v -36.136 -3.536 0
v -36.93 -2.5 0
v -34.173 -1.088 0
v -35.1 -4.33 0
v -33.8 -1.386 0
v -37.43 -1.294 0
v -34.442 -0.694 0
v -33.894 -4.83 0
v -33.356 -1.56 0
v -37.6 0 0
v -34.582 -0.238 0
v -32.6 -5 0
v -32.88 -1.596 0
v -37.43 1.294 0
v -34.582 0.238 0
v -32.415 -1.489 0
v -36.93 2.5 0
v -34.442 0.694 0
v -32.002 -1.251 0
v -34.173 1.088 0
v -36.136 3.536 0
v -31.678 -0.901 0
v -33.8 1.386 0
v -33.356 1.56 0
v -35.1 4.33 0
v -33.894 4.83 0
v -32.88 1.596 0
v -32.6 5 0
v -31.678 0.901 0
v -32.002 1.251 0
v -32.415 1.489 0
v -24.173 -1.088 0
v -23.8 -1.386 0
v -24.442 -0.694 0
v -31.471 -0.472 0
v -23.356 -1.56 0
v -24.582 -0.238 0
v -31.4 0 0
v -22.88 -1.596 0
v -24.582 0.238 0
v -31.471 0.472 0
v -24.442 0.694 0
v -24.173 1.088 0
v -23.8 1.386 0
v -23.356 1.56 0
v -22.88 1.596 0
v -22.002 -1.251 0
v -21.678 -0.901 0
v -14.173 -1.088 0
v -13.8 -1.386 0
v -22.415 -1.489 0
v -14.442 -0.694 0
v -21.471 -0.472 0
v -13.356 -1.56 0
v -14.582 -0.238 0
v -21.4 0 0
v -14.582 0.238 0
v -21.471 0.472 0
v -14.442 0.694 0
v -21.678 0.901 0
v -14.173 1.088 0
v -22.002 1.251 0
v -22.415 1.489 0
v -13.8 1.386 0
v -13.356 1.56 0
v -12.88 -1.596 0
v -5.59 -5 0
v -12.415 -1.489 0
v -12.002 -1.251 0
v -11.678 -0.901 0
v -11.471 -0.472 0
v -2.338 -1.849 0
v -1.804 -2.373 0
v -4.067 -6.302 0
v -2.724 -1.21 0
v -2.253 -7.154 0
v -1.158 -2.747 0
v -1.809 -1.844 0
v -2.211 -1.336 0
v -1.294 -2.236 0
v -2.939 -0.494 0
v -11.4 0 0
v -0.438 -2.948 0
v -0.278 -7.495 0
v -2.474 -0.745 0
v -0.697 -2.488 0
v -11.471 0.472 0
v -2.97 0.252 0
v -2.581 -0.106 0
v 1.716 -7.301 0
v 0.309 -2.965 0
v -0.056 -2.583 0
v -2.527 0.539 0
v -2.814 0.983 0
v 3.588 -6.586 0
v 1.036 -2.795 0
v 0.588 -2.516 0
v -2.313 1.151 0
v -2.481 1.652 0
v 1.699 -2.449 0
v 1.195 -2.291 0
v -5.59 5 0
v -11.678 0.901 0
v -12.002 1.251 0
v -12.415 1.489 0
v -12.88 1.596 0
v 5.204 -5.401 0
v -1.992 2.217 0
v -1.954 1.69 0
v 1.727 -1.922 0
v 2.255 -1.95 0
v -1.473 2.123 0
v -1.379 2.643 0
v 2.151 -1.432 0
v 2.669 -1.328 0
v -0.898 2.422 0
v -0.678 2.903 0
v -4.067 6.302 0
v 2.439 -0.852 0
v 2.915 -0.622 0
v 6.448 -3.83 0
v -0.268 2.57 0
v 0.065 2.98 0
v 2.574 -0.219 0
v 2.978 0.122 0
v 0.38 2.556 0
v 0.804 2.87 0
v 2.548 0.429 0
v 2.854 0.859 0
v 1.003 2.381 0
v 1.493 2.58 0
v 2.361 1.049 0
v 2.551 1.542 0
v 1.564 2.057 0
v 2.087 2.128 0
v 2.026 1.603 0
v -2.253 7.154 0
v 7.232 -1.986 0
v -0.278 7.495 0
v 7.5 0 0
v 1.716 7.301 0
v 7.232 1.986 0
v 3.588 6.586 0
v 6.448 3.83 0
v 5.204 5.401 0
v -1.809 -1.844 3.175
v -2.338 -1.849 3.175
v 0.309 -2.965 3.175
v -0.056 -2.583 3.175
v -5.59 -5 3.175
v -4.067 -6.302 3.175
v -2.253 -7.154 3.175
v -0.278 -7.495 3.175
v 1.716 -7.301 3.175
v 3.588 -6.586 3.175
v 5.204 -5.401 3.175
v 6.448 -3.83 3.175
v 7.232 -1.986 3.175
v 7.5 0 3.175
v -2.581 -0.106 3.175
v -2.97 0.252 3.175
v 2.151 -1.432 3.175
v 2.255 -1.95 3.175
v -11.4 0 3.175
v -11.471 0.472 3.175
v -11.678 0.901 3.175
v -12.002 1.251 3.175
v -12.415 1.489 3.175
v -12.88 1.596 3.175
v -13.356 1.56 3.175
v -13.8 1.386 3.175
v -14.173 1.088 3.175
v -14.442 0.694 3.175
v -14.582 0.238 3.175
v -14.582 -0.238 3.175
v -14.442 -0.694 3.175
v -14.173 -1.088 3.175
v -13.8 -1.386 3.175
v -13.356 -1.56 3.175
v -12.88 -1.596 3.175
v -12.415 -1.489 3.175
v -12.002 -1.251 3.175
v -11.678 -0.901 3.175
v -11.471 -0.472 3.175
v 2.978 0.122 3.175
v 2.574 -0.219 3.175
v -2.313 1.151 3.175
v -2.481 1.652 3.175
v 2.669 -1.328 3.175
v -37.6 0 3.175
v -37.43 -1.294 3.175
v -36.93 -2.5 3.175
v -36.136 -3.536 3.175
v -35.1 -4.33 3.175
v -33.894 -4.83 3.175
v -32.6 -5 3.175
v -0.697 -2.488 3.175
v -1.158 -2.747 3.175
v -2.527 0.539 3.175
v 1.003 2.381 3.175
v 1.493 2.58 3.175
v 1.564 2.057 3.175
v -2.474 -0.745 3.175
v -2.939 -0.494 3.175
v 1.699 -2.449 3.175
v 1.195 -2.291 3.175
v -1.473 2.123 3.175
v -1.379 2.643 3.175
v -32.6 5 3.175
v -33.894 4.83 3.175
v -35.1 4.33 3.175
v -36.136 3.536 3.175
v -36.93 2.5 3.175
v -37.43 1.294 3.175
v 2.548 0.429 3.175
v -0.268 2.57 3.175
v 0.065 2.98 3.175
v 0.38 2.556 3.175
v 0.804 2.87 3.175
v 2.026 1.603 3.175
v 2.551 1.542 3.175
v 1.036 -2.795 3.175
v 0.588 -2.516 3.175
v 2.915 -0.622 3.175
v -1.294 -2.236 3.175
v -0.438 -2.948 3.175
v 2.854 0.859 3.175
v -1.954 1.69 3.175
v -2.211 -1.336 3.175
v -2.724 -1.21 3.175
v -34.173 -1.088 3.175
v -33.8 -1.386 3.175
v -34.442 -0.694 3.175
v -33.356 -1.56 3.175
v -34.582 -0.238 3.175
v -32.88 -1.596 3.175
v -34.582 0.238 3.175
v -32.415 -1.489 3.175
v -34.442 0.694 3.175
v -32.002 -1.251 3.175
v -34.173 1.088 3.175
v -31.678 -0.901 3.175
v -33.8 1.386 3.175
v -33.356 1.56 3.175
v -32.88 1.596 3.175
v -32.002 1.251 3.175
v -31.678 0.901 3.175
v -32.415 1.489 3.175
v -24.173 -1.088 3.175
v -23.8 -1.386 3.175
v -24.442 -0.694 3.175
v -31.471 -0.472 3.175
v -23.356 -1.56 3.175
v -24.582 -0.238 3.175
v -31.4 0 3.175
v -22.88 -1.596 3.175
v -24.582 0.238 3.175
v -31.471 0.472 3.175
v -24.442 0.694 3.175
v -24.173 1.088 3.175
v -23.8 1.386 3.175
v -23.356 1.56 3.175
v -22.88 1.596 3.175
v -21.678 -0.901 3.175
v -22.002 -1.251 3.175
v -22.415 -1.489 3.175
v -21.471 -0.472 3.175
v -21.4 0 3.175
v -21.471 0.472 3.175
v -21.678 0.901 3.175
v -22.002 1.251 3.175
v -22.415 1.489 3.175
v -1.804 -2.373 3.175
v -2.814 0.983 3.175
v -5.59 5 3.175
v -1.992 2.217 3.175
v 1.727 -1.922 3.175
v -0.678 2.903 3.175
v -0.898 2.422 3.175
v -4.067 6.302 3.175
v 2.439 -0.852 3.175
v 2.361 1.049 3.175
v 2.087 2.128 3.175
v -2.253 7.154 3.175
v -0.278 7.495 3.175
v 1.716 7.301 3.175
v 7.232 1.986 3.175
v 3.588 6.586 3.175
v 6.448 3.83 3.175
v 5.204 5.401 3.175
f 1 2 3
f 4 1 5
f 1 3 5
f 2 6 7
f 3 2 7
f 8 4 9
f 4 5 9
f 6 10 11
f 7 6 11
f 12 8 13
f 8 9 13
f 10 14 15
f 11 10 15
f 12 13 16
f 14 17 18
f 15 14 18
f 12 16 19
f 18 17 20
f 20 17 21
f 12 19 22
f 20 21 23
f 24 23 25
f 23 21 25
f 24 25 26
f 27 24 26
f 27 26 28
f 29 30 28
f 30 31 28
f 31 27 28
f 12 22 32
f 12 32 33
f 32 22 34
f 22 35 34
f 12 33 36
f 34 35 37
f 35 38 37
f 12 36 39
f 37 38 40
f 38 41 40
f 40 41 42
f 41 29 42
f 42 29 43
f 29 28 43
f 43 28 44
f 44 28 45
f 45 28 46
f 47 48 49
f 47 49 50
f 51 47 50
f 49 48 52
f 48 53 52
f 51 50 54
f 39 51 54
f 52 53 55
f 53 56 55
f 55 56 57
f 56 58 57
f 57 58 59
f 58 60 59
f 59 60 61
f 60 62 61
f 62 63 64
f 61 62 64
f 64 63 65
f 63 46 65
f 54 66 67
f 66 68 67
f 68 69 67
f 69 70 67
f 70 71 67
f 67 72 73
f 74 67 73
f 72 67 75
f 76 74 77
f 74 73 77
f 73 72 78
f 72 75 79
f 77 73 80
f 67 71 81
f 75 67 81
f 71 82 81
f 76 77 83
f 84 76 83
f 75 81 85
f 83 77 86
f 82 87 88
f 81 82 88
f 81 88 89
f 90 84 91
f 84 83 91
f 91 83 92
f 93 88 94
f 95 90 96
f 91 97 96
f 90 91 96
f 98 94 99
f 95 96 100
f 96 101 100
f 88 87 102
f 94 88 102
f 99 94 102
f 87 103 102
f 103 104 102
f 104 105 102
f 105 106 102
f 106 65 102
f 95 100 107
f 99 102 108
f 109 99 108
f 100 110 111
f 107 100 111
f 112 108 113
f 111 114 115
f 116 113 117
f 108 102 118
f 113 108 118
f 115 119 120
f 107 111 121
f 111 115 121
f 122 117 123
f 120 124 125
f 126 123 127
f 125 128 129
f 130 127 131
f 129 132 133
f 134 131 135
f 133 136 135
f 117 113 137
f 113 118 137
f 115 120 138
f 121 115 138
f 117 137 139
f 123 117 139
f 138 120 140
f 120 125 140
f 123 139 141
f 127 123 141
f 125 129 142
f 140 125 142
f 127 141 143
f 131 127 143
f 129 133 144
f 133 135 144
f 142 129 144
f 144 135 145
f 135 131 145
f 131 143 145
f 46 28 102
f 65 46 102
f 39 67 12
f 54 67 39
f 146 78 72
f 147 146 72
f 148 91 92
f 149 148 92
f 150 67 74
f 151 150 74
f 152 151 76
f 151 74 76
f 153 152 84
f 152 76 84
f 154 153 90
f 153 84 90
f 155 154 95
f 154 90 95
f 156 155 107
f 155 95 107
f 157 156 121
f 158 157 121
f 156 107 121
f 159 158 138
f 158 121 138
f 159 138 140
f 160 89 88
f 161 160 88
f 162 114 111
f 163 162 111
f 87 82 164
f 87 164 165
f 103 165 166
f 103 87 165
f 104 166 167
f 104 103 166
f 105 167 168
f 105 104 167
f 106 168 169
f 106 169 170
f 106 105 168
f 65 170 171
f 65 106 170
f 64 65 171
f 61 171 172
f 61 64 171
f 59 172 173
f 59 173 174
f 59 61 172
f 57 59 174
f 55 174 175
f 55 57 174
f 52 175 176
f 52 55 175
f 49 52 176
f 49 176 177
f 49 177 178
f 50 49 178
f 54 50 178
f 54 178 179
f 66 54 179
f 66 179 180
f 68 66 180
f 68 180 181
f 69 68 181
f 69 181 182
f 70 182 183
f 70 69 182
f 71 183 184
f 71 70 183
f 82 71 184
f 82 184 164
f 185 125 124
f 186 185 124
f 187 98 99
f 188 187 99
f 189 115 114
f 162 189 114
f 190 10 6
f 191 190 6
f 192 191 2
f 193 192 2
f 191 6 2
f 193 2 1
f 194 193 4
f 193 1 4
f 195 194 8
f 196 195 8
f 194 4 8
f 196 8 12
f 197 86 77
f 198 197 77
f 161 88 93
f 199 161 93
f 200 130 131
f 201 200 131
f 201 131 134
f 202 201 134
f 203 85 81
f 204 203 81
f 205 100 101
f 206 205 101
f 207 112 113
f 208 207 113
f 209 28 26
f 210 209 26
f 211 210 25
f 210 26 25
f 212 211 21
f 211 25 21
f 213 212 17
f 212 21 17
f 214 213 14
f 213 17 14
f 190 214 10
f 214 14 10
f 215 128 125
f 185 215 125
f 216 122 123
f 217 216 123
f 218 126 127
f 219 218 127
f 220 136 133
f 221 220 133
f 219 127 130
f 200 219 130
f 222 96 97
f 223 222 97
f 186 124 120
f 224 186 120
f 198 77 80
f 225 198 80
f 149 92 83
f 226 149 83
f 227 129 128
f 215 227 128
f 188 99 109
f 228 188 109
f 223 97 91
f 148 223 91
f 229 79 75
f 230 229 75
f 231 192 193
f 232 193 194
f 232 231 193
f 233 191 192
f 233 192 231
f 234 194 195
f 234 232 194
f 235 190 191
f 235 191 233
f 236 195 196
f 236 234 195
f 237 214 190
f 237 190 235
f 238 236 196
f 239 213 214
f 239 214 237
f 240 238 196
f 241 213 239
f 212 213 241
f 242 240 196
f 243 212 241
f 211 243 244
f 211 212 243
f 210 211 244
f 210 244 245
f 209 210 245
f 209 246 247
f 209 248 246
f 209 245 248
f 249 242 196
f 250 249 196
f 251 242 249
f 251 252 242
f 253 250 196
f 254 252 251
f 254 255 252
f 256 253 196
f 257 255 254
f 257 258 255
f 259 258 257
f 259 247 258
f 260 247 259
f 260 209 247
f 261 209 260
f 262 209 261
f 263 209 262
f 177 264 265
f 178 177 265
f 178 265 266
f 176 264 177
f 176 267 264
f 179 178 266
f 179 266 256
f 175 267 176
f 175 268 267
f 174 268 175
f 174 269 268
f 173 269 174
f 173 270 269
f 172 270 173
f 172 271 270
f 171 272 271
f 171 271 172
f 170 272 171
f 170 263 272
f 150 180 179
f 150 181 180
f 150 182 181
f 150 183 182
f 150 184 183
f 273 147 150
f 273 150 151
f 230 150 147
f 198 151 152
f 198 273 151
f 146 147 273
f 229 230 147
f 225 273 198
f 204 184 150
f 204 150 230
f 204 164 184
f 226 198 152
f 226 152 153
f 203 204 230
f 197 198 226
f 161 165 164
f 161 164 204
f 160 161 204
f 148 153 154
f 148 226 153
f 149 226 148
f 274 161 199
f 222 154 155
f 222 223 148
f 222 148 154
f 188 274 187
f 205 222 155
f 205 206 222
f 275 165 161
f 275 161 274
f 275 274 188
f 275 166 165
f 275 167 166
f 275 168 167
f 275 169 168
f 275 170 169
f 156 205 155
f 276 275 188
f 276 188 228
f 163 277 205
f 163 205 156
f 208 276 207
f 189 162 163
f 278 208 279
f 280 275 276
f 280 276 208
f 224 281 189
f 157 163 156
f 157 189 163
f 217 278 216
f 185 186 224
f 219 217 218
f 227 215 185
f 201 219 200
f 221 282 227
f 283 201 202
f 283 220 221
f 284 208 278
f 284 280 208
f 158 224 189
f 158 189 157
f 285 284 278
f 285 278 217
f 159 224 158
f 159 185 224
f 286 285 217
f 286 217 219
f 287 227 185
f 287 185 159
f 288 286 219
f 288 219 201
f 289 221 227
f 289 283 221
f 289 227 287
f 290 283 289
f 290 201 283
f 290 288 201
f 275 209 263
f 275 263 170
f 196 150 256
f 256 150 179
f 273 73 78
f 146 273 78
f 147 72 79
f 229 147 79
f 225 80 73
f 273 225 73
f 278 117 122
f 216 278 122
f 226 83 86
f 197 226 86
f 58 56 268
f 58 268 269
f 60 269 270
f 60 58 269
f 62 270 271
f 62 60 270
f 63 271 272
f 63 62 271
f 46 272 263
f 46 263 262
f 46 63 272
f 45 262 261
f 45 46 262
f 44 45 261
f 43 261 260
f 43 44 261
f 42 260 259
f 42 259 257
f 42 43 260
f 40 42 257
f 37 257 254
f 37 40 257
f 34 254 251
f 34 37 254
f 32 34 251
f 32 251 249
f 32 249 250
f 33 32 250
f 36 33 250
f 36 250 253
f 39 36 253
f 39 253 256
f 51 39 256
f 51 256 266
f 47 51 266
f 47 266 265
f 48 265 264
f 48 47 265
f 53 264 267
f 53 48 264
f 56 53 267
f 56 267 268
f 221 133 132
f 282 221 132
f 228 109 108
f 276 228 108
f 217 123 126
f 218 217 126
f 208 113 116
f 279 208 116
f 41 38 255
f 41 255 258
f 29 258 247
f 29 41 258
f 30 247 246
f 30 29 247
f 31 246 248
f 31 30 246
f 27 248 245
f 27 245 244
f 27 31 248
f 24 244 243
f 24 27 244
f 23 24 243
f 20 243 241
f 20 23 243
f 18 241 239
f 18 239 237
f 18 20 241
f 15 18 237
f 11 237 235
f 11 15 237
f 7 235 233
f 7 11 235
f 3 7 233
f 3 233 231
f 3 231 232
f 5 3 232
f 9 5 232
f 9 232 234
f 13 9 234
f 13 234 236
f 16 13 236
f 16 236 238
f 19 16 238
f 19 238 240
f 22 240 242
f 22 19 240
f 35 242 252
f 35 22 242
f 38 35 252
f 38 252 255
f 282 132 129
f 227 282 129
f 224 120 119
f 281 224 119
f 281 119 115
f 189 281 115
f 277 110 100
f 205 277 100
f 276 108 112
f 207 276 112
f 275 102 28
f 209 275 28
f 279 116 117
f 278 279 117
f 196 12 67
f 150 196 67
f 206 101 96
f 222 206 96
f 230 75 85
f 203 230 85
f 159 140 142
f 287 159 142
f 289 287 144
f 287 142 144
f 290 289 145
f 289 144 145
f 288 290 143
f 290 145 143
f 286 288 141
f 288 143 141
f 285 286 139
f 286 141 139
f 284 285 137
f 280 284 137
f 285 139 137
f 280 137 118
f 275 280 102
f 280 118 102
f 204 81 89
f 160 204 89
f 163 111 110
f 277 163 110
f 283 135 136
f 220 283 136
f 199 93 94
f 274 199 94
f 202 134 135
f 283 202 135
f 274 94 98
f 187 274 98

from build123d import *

# Parameters (mm, degrees)
F0_R     = 1.6
F1_DEPTH = 3.175


with BuildPart() as f1:
    # F0 (on Top) → F1 (new body)
    with BuildSketch(Plane.XY):
        with BuildLine():
            ThreePointArc((7.5, 0), (2.6761656733, 7.0062926922), (-5.5901699437, 5))
            Line((-5.5901699437, 5), (-32.6, 5))
            ThreePointArc((-32.6, 5), (-36.1355339059, 3.5355339059), (-37.6, 0))
            ThreePointArc((-37.6, 0), (-36.1355339059, -3.5355339059), (-32.6, -5))
            Line((-32.6, -5), (-5.5901699437, -5))
            ThreePointArc((-5.5901699437, -5), (2.6761656733, -7.0062926922), (7.5, 0))
        make_face()
        with Locations((-33, 0)):
            Circle(F0_R, mode=Mode.SUBTRACT)
        with Locations((-23, 0)):
            Circle(F0_R, mode=Mode.SUBTRACT)
        with Locations((-13, 0)):
            Circle(F0_R, mode=Mode.SUBTRACT)
        Polygon((-2.3131272616, 1.150841372), (-2.4811892868, 1.651717782), (-1.9542535042, 1.6899369317), (-1.992472654, 2.2168727143), (-1.4725868119, 2.1228475389), (-1.3785616365, 2.6427333809), (-0.8983920744, 2.4223718279), (-0.6780305213, 2.90254139), (-0.2677480588, 2.5696895861), (0.0651037451, 2.9799720486), (0.379719552, 2.555544297), (0.8041473037, 2.8701601039), (1.0033279869, 2.380824761), (1.4926633298, 2.5800054442), (1.5638936344, 2.0565092492), (2.0873898293, 2.1277395538), (2.0261940932, 1.6029756981), (2.5509579489, 1.5417799619), (2.3611813253, 1.0487212884), (2.8542399989, 0.8589446648), (2.547806851, 0.4285718633), (2.9781796525, 0.1221387154), (2.574344302, -0.2185063082), (2.9149893256, -0.6223416587), (2.4391262327, -0.8518549247), (2.6686394987, -1.3277180175), (2.1506488918, -1.4316783634), (2.2546092377, -1.9496689703), (1.7270383715, -1.9215441851), (1.6989135863, -2.4491150513), (1.1949116786, -2.2906723188), (1.0364689461, -2.7946742265), (0.5877042905, -2.5158690862), (0.3088991502, -2.9646337418), (-0.0564307197, -2.5829845462), (-0.4380799154, -2.9483144161), (-0.6970199802, -2.4878015876), (-1.1575328087, -2.7467416524), (-1.2938129119, -2.2363009057), (-1.8042536586, -2.3725810089), (-1.80931082, -1.8442852134), (-2.3376066155, -1.8493423749), (-2.2111230752, -1.3363862984), (-2.7240791517, -1.209902758), (-2.4740023355, -0.7445173173), (-2.9393877762, -0.4944405012), (-2.5814309304, -0.105867575), (-2.9700038565, 0.2520892708), (-2.5266587261, 0.5394342163), (-2.8140036716, 0.9827793468), align=None, mode=Mode.SUBTRACT)
    extrude(amount=F1_DEPTH)


solid = f1.part
